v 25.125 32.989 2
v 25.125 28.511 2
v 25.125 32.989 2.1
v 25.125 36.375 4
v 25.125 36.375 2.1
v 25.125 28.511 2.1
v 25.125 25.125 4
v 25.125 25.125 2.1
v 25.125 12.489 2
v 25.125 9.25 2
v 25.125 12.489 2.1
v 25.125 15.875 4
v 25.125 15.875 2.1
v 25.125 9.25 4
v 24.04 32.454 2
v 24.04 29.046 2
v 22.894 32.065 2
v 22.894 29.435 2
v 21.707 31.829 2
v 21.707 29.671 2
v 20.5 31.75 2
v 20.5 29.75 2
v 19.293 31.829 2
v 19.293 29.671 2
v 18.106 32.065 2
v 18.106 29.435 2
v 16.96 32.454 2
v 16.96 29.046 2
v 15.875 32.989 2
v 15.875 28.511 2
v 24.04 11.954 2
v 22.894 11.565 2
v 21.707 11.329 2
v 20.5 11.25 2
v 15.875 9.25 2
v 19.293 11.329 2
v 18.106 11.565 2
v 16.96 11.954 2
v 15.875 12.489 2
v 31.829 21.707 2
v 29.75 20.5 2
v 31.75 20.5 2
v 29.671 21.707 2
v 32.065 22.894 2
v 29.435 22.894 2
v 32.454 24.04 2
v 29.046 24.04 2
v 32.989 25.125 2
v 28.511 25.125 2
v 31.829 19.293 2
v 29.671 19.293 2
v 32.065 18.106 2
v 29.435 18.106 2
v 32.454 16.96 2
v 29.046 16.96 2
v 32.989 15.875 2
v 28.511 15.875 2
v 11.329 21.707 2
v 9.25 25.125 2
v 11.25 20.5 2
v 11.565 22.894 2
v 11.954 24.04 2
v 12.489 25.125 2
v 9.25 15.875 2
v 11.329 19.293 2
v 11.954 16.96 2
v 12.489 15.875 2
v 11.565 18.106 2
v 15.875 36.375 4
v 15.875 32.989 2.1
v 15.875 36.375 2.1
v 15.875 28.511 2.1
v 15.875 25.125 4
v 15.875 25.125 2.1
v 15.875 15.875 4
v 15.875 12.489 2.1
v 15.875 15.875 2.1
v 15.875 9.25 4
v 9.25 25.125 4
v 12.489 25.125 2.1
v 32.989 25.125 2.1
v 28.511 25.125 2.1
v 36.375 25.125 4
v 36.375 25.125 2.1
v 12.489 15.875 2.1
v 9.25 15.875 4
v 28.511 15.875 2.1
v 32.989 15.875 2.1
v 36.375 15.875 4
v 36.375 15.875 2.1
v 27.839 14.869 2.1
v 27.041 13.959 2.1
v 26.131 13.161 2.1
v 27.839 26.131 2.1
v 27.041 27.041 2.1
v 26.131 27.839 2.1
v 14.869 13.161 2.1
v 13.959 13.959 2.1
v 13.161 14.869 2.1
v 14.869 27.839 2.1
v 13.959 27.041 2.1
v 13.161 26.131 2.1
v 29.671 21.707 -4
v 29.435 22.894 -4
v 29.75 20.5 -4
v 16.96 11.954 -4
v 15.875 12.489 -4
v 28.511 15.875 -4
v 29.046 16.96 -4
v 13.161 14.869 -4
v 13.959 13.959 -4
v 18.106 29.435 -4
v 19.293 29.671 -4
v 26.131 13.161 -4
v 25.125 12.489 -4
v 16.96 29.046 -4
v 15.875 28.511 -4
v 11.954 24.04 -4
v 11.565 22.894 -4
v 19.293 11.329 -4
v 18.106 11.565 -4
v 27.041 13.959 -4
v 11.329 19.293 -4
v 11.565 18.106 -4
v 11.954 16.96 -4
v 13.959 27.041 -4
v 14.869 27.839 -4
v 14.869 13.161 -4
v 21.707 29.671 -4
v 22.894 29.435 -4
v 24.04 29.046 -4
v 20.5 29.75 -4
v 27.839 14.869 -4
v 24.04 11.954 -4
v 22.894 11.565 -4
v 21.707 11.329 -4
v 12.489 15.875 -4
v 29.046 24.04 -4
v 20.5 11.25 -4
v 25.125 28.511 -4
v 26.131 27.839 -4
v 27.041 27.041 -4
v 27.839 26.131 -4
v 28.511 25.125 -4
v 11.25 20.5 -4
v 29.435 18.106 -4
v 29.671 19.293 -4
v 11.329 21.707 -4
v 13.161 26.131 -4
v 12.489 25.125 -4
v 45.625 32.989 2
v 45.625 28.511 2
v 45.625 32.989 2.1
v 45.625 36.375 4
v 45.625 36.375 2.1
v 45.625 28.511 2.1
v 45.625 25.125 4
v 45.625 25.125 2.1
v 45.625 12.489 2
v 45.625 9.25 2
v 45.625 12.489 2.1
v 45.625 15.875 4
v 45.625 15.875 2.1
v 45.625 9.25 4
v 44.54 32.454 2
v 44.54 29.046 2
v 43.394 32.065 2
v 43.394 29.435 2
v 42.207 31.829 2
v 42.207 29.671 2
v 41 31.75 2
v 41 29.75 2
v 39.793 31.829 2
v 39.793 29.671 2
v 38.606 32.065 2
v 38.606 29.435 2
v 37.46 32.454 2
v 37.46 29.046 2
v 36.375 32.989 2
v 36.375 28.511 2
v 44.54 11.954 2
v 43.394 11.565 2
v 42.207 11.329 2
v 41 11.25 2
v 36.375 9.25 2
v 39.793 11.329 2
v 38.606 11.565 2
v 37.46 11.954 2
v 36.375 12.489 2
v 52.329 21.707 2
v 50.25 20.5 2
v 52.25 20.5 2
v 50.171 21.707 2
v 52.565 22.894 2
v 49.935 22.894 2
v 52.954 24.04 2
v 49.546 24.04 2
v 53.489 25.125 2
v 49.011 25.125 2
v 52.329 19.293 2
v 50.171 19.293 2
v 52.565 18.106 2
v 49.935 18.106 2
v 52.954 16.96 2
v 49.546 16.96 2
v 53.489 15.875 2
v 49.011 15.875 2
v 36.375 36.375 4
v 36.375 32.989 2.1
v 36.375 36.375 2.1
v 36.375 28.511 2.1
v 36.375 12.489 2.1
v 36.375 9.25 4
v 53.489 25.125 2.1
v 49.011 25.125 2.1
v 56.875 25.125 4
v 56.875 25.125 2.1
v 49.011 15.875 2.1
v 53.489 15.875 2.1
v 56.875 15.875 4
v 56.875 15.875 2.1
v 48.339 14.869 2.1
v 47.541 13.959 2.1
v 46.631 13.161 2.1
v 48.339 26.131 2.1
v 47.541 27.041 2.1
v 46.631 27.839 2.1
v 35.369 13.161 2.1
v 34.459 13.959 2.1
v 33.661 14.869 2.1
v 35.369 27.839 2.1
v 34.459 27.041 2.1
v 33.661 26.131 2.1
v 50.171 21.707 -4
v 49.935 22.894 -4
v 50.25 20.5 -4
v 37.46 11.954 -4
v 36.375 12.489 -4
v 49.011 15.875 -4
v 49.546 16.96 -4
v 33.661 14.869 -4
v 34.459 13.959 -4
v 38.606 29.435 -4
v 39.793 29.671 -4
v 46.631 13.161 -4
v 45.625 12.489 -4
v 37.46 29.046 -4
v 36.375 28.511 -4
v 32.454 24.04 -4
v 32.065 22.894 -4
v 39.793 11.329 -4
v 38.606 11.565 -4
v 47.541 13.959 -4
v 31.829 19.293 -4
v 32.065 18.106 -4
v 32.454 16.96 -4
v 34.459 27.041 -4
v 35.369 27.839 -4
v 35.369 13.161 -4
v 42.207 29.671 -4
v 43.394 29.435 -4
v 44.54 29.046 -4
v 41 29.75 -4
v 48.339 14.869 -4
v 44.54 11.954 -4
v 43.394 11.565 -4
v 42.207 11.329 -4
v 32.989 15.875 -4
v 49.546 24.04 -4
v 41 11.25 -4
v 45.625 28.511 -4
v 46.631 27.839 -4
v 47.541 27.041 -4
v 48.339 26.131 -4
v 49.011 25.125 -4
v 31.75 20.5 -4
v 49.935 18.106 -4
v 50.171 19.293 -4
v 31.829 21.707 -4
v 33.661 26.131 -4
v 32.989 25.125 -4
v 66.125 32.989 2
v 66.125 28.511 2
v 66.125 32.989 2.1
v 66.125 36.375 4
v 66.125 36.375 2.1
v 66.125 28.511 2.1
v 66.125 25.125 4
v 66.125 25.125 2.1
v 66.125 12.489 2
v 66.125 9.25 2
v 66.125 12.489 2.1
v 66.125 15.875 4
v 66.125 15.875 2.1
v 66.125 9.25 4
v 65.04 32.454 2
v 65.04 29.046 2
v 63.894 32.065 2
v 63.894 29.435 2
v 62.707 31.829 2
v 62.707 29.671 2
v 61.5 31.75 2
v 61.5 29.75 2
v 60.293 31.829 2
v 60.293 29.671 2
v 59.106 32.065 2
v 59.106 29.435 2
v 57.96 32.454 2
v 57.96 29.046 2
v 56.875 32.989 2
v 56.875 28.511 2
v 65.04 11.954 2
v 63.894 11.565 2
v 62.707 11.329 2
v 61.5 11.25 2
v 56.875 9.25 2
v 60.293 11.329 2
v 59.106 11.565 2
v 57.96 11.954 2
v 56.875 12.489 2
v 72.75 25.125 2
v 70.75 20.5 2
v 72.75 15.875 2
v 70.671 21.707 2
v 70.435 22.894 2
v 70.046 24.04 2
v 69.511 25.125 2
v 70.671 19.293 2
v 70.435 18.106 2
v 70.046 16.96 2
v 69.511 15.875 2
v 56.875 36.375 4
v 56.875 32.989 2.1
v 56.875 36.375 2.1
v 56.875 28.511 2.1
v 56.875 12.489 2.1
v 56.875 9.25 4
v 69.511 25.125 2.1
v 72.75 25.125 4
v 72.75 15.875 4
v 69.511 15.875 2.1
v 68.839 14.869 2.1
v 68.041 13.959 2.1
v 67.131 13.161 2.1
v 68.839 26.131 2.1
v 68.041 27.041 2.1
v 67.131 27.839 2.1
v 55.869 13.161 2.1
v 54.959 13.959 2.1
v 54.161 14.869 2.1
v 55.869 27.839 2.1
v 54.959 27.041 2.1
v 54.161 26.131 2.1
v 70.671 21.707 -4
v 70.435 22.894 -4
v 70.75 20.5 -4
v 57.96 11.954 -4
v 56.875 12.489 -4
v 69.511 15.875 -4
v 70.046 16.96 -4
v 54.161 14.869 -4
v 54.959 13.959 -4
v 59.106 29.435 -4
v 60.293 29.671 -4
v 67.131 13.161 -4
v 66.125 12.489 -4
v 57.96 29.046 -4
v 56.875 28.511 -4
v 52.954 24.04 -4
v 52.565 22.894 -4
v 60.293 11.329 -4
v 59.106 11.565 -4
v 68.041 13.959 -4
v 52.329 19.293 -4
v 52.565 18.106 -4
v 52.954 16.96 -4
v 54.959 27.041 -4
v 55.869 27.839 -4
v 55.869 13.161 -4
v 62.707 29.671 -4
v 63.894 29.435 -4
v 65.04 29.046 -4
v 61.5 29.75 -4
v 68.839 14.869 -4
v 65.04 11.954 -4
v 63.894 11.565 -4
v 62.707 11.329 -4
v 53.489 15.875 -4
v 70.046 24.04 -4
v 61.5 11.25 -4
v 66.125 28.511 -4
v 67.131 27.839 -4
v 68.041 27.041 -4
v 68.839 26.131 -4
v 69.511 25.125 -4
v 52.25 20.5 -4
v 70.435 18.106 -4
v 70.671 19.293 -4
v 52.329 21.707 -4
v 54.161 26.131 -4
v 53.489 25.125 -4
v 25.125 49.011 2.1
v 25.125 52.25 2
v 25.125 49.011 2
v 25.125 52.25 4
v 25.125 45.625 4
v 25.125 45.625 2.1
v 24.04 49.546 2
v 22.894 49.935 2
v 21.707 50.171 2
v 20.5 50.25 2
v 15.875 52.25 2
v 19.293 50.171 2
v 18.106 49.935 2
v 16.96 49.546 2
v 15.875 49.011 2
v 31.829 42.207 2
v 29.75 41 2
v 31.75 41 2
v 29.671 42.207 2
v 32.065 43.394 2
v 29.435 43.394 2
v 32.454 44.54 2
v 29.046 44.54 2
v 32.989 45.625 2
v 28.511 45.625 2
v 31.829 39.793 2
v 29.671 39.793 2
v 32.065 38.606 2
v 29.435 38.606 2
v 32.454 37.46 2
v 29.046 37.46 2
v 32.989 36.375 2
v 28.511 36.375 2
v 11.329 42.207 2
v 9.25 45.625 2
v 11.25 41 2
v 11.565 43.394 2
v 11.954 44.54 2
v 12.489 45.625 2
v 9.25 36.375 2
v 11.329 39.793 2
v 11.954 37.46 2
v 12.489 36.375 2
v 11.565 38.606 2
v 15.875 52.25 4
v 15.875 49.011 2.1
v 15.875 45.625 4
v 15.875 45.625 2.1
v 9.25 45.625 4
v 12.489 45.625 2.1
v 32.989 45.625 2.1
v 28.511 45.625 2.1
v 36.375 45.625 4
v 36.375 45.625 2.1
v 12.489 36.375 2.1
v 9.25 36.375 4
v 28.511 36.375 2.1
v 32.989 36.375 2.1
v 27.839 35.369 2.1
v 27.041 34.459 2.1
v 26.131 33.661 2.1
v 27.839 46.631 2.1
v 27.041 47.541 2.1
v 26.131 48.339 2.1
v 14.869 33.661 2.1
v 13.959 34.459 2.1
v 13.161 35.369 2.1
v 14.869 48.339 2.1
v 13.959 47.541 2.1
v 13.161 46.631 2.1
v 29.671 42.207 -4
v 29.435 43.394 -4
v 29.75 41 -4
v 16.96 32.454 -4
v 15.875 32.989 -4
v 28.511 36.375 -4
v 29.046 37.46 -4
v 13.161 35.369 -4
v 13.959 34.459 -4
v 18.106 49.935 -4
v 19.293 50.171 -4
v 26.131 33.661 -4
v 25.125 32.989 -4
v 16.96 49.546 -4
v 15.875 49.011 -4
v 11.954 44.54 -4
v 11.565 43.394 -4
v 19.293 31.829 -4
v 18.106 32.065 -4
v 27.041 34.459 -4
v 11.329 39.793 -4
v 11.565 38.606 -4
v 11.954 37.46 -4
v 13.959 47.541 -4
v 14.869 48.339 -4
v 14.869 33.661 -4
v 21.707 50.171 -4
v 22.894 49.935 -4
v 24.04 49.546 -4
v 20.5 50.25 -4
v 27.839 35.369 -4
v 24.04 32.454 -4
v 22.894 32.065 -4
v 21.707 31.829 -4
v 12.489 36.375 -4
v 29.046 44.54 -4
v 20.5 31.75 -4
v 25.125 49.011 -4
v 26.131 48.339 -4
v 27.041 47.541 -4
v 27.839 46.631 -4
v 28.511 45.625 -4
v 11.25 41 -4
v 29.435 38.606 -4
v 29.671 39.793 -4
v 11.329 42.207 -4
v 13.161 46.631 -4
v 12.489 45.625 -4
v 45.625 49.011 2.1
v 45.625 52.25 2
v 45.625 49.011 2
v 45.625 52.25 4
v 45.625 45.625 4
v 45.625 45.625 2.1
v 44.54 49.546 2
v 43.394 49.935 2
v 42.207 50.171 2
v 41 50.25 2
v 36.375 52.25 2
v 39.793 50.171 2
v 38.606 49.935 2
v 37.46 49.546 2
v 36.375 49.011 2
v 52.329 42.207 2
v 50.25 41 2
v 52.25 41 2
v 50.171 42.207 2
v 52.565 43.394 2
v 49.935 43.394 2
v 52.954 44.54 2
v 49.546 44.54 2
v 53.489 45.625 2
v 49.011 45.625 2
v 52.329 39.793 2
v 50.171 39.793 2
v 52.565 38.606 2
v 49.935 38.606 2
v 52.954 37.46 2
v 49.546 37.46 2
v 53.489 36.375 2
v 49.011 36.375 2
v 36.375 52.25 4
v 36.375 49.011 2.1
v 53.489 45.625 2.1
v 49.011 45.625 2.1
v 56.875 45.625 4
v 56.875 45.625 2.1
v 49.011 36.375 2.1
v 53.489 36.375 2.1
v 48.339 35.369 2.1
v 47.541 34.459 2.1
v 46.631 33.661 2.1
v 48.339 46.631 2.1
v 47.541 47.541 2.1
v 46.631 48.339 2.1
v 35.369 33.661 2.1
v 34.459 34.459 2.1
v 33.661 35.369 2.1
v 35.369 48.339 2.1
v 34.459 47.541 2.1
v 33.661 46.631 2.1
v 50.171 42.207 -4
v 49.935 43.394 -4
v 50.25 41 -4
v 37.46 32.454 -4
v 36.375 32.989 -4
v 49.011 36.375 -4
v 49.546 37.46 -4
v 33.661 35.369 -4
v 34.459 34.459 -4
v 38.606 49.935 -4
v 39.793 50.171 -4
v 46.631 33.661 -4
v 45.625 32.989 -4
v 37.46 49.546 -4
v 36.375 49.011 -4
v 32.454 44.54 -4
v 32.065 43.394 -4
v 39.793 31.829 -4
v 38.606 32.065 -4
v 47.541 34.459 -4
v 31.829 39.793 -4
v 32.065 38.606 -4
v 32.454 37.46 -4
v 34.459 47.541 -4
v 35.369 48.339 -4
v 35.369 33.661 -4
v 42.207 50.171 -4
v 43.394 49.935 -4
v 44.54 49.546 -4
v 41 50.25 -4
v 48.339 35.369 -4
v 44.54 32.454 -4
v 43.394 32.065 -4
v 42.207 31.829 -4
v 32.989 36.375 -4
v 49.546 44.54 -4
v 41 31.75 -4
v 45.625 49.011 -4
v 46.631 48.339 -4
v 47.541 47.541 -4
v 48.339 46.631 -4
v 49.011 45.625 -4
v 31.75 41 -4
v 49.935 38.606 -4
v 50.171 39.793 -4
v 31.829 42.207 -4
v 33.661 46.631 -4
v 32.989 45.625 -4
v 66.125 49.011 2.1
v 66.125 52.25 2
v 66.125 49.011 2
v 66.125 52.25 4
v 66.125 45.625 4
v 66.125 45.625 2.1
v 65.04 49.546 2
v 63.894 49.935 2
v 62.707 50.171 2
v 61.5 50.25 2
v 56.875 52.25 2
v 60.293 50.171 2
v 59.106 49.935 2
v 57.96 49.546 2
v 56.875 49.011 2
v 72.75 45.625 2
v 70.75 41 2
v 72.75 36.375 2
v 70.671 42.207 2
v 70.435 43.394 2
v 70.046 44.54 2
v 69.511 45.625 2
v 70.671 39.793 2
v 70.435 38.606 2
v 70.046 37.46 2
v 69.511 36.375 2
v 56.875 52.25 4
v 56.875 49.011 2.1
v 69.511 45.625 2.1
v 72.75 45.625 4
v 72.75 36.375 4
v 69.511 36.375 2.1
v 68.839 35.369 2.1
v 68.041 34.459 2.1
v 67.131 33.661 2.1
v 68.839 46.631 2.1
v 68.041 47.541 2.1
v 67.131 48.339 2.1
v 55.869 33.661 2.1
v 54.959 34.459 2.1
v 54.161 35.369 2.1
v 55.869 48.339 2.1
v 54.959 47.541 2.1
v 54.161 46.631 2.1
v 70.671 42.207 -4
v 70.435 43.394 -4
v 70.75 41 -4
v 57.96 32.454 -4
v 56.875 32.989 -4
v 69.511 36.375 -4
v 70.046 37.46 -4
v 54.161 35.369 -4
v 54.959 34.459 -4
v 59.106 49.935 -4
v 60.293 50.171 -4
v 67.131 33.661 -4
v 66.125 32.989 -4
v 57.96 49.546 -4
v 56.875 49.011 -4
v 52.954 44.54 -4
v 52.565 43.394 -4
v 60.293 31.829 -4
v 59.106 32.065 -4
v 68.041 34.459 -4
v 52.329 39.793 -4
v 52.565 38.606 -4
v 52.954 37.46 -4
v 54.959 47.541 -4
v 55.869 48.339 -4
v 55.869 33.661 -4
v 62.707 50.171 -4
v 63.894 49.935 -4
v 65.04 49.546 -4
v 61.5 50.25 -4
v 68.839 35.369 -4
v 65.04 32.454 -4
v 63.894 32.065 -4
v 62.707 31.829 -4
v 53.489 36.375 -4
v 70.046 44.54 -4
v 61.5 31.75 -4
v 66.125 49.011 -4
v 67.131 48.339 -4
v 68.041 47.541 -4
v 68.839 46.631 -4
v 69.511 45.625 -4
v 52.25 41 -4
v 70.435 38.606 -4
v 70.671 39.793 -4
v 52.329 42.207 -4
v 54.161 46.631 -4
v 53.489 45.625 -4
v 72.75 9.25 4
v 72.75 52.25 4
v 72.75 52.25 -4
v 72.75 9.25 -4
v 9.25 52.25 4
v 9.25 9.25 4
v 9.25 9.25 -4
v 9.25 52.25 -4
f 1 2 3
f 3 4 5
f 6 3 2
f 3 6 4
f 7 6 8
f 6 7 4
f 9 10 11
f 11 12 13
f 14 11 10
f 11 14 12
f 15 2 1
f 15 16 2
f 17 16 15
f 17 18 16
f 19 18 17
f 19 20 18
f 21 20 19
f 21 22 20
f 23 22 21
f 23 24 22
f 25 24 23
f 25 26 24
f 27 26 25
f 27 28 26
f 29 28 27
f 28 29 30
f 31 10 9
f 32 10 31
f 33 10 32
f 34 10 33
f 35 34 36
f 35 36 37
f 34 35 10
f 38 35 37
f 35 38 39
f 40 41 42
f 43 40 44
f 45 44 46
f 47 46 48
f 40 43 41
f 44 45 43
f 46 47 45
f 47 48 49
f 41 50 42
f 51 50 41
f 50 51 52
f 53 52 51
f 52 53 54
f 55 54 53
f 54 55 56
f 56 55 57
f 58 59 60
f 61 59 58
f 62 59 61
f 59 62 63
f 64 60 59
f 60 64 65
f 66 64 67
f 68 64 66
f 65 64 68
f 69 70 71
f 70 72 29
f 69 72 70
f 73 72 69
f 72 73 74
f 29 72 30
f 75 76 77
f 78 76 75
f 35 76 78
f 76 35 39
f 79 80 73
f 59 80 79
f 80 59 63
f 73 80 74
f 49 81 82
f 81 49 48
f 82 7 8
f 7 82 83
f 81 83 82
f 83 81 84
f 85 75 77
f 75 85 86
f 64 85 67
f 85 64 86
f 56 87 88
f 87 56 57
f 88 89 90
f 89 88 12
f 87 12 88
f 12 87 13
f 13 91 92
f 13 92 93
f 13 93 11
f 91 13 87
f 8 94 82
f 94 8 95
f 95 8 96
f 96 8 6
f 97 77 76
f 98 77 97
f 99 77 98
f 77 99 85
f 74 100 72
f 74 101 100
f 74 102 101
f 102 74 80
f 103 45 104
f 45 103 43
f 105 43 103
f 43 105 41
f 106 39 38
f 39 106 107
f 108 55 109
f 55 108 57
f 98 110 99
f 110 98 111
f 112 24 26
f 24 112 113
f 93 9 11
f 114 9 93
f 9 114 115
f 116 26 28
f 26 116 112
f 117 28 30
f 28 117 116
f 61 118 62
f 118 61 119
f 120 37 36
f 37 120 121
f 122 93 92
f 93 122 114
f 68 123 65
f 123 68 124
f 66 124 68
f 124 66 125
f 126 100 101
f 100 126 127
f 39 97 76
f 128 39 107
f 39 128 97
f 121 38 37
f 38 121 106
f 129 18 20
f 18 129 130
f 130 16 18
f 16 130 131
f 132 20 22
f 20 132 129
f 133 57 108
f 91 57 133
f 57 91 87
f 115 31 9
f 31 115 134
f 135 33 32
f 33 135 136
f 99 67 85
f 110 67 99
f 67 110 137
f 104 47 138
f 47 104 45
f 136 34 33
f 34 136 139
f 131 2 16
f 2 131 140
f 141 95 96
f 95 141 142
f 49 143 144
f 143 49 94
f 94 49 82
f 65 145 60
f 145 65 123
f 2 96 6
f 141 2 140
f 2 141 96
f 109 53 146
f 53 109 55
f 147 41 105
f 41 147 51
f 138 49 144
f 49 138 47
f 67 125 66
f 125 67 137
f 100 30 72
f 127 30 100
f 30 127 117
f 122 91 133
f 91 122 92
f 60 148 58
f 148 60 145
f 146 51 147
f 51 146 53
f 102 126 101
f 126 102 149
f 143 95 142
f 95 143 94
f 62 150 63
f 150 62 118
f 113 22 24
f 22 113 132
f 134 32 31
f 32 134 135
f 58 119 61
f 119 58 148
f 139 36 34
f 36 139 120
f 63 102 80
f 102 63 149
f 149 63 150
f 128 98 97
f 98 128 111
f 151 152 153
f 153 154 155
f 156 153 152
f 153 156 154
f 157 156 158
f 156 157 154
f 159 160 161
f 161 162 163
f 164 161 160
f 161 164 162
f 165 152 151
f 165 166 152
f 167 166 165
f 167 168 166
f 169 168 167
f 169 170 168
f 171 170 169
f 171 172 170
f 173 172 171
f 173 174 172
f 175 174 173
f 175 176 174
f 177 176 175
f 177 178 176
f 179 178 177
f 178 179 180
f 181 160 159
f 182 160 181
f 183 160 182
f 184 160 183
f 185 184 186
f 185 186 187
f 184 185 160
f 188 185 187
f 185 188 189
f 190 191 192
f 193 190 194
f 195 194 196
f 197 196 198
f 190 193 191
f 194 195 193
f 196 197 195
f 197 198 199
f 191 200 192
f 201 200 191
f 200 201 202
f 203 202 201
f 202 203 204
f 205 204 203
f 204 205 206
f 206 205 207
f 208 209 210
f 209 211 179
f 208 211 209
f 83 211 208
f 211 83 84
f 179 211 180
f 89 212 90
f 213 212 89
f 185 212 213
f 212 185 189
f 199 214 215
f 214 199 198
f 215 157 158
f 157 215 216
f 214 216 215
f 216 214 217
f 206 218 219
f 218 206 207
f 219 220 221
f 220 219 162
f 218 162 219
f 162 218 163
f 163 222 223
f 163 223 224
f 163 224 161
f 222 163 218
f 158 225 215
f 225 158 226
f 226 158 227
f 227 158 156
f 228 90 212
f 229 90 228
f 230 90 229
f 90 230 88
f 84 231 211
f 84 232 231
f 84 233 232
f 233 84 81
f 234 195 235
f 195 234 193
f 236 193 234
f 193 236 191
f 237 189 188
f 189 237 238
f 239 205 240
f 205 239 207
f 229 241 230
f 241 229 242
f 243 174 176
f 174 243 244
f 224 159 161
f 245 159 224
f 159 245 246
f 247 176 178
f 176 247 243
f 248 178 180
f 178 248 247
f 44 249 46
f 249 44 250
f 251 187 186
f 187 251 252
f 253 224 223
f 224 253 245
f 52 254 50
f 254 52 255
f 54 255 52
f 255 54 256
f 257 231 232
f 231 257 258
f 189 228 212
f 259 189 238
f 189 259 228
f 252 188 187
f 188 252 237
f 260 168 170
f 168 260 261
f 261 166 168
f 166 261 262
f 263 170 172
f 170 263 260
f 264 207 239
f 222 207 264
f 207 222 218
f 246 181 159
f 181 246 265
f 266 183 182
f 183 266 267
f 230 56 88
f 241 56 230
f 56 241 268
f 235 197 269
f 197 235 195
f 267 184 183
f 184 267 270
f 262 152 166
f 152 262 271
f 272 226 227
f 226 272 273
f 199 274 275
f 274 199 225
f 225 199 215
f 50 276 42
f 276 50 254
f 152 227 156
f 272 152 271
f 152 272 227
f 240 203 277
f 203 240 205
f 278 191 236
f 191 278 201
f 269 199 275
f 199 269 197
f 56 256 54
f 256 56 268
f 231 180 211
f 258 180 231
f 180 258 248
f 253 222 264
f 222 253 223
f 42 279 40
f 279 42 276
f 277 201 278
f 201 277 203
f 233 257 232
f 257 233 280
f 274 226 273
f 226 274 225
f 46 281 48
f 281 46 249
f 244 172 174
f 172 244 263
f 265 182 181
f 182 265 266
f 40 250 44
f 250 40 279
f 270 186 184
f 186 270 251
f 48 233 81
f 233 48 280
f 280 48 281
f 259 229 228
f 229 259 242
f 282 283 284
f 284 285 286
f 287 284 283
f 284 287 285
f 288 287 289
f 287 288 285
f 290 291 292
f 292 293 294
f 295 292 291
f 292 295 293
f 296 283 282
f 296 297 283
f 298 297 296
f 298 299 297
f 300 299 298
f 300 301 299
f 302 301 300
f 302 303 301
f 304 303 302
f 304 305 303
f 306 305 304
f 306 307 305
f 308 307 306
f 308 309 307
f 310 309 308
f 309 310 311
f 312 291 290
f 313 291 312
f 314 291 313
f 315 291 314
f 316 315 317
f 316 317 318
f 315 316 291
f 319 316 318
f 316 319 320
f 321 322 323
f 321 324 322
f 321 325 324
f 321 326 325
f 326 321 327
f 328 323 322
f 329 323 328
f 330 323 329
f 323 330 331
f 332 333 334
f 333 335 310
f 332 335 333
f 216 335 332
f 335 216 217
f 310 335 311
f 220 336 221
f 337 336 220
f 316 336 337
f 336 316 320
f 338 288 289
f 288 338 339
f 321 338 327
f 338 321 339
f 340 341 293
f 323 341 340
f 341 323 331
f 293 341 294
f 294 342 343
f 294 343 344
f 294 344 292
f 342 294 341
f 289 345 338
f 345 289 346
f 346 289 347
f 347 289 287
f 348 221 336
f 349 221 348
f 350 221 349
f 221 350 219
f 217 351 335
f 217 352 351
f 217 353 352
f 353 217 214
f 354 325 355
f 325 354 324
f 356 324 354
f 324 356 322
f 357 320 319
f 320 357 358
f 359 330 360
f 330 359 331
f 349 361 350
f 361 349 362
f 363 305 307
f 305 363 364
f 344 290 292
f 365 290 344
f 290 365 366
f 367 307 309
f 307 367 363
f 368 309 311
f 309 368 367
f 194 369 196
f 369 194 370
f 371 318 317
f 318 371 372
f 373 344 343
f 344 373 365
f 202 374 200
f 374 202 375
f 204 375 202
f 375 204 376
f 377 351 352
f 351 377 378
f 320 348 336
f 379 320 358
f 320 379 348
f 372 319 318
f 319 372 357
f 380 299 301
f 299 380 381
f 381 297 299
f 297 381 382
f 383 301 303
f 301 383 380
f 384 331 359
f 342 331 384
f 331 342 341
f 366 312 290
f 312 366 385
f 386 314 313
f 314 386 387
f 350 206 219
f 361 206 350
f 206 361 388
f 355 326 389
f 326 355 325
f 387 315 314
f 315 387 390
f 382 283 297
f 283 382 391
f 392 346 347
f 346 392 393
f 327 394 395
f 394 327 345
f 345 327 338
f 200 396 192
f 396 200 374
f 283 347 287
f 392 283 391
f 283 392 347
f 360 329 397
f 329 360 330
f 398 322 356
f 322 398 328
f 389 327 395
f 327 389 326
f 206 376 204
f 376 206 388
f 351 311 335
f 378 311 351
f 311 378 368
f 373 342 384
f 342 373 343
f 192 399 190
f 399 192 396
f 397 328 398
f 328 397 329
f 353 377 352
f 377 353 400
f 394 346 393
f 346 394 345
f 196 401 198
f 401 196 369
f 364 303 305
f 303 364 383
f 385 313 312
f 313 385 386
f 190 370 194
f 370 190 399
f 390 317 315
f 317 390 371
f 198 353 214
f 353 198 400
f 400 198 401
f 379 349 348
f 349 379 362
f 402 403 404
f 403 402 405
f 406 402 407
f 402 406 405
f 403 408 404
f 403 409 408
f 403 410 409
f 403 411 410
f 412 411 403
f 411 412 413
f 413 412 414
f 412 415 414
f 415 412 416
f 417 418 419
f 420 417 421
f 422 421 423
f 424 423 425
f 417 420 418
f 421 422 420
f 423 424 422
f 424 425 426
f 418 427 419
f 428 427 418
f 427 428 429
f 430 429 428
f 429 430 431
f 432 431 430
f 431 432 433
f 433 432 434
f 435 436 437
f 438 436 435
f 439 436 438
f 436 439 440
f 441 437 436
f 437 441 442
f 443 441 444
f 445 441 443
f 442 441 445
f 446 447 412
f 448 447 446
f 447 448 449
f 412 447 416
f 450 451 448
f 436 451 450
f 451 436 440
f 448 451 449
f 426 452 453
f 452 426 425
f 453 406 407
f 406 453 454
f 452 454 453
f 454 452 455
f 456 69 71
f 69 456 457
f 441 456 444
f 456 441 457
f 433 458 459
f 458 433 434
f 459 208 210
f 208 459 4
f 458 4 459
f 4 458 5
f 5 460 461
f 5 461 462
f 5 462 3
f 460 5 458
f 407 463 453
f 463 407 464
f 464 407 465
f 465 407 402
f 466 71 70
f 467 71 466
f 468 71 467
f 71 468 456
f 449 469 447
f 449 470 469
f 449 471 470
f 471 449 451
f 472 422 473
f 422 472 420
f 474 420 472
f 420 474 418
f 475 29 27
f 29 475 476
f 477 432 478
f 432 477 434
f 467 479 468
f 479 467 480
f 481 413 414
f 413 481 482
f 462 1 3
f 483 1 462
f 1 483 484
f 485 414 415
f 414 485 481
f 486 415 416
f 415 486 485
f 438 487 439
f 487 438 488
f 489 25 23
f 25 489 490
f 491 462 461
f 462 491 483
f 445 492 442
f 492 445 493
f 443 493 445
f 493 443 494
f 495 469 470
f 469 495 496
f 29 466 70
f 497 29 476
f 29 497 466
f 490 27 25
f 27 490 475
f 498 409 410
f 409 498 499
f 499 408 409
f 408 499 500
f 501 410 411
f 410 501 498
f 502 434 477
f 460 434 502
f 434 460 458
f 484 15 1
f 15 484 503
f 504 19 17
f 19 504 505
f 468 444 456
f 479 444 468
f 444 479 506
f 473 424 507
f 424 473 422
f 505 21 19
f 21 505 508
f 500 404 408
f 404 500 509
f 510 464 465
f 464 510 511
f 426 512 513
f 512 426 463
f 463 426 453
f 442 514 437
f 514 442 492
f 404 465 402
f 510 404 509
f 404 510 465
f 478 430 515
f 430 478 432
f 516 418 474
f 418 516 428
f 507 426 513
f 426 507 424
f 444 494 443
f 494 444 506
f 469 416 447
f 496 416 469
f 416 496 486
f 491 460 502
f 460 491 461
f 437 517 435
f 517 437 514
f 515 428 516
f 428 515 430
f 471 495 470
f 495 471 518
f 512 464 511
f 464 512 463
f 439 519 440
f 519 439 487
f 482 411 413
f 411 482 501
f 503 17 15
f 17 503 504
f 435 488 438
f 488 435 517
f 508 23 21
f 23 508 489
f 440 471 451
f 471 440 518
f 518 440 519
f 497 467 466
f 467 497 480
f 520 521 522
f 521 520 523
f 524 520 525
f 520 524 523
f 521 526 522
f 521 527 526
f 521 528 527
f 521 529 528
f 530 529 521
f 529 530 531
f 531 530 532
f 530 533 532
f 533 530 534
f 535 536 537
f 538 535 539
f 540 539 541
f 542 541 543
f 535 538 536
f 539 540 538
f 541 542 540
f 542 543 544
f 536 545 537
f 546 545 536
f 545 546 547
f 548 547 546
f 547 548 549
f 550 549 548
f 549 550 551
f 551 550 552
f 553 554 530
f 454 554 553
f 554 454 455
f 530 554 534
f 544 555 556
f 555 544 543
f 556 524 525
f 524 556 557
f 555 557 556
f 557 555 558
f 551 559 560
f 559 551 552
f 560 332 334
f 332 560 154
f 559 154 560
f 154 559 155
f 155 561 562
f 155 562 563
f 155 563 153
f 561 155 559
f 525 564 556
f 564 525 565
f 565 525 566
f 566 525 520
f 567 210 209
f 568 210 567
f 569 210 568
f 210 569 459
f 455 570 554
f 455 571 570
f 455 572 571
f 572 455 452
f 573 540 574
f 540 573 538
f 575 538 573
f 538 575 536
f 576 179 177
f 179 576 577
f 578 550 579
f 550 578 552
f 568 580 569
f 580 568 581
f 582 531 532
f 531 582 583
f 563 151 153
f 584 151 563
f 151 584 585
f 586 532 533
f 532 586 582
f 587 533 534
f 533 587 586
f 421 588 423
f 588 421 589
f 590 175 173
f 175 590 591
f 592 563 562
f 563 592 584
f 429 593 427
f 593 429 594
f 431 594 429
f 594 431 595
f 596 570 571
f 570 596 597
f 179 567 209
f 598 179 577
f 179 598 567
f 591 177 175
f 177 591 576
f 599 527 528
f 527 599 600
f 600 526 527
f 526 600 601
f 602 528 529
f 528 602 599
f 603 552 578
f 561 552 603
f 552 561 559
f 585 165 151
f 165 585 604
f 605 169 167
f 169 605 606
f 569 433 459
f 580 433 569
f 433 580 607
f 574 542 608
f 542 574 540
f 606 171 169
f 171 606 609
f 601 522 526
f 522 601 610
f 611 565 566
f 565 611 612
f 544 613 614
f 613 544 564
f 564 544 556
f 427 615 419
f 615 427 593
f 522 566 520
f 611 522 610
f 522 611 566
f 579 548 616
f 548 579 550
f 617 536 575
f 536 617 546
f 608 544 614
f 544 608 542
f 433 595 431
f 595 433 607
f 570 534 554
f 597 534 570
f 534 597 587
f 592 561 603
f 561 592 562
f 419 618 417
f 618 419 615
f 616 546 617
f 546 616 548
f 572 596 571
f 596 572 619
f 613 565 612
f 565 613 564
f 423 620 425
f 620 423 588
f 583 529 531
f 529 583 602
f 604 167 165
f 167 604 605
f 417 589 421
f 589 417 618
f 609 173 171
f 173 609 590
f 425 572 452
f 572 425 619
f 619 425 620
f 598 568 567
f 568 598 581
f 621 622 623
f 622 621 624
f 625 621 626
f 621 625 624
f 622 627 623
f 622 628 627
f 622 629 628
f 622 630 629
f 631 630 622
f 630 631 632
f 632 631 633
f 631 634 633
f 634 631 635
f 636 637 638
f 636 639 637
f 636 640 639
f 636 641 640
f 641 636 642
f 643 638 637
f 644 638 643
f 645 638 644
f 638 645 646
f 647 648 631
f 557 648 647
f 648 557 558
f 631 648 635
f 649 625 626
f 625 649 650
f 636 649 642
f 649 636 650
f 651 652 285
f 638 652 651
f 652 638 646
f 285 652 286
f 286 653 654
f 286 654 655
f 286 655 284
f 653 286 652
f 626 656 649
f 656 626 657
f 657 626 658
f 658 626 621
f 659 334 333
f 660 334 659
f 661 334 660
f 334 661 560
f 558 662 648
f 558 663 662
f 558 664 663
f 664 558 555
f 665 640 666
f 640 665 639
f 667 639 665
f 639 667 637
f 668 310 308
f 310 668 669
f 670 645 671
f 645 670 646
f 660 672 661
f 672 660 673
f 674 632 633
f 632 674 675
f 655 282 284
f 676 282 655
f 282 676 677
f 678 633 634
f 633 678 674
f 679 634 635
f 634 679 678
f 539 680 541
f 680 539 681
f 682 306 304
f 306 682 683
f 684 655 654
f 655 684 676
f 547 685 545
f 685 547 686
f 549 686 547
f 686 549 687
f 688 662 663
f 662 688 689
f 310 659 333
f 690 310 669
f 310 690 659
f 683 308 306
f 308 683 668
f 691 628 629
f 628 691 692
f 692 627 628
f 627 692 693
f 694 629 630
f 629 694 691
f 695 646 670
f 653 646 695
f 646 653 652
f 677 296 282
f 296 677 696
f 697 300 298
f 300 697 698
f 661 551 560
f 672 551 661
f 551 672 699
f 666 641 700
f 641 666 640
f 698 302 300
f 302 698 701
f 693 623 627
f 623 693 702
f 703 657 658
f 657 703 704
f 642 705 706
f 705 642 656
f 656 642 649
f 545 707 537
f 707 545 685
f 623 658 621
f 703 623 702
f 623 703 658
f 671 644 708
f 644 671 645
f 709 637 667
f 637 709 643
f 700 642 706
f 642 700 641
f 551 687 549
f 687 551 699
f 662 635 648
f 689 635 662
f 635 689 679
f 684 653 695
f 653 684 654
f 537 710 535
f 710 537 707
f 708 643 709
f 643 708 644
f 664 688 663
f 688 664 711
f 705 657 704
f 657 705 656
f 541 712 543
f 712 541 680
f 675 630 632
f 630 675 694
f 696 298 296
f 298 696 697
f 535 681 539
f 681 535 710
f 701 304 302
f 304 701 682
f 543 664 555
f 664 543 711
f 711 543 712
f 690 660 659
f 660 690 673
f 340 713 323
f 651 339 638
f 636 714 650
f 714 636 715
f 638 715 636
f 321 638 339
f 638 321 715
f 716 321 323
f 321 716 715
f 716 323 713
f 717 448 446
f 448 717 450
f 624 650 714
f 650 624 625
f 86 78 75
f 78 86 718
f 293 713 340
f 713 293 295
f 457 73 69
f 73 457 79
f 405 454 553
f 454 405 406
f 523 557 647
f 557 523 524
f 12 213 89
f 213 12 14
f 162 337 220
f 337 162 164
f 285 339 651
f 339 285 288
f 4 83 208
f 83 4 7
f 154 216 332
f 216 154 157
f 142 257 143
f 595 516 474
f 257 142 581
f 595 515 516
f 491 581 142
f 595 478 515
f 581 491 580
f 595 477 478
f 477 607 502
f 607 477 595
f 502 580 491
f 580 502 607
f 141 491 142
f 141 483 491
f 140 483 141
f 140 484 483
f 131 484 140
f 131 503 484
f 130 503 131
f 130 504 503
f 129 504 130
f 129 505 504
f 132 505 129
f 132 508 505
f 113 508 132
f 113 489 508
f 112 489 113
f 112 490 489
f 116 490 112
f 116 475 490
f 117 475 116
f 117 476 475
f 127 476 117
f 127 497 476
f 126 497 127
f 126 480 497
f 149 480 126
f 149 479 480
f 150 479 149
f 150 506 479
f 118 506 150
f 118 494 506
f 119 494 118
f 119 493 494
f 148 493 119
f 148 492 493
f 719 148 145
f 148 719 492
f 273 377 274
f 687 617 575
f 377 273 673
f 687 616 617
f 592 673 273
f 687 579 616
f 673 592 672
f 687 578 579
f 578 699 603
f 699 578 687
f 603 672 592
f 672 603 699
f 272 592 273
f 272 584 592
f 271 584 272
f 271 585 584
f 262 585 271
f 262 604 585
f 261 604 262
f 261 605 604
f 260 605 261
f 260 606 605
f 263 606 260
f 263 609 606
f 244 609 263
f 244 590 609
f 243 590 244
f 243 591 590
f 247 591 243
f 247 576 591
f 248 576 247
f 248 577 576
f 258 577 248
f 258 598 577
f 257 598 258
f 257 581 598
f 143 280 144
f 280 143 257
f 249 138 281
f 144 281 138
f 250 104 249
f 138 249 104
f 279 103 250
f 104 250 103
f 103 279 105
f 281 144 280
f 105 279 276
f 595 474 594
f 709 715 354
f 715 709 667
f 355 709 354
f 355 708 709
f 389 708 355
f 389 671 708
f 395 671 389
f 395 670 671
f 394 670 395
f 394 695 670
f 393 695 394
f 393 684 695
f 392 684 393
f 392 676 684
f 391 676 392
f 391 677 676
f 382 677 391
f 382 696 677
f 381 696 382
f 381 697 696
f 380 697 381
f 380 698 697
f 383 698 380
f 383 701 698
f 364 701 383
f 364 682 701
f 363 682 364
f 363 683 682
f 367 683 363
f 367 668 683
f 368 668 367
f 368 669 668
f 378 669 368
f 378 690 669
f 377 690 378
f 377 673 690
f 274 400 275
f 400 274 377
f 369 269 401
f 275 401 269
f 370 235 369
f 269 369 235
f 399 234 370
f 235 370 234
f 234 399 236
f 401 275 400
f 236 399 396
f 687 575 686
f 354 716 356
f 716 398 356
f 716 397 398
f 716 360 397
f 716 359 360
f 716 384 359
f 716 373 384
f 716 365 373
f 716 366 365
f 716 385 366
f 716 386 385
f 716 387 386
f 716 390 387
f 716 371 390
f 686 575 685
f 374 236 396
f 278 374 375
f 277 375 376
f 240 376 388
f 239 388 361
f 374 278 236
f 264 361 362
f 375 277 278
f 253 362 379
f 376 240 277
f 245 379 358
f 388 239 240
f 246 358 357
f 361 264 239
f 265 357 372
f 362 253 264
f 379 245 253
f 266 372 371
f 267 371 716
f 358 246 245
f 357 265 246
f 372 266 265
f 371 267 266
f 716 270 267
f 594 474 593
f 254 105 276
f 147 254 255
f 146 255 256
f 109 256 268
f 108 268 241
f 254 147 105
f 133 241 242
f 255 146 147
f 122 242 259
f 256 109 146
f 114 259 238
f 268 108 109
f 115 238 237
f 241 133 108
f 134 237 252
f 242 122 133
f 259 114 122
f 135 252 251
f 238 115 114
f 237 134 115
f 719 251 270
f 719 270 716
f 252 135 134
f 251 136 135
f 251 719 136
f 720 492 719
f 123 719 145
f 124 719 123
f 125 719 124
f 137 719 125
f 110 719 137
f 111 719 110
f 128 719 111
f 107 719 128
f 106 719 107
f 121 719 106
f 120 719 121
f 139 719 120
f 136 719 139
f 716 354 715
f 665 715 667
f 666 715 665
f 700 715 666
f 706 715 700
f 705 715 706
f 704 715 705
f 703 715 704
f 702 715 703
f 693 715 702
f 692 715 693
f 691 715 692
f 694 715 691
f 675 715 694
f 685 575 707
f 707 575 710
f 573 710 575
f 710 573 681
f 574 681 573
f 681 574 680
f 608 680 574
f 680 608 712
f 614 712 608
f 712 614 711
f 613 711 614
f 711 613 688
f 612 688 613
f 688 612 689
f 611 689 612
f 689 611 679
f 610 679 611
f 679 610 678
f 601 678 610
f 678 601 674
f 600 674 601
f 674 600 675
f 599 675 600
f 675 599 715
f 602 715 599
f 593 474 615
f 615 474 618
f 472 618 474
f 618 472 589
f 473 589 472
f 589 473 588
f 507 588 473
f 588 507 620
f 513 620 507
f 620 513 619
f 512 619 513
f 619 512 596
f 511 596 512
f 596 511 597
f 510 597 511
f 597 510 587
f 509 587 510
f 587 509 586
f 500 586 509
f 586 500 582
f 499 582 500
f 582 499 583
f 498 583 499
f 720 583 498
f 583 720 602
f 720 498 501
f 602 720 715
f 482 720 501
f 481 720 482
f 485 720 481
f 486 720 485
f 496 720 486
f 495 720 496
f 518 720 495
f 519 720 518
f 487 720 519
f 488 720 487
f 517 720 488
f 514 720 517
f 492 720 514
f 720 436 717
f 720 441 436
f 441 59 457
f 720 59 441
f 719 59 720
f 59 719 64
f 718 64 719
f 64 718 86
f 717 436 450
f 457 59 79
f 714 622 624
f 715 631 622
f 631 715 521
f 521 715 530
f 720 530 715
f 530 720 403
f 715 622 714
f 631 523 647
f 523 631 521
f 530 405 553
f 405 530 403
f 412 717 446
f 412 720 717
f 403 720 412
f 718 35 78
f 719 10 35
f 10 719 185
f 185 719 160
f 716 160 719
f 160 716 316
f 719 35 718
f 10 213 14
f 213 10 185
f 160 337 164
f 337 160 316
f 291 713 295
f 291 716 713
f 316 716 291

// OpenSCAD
// Cell Diameter
cell = 18.5;
// Number of Rows
rows = 3; // [0:10]
// Number of Columns
cols = 2; // [0:10]
// Holder Height
height = 8;
// Space betwen Cells
space = 2;

cubeSize = cell+space;

// number of faces in circle
$fn = 48; 
difference()
{
    translate([(rows+1)*cubeSize/2, (cols+1)*cubeSize/2, 0])
    cube(size = [cubeSize*rows+space, cubeSize*cols+space, height], center = true);
    
    for ( i = [1 : cols] )
    {
        translate([0,i*cubeSize,0])
        for ( ii = [1 : rows] )
        {
            translate([ii*cubeSize,0,0])
            
            union()
            {
                translate([0,0,height/2]) cube(size = [cell/2,cubeSize+3,4], center = true);
                translate([0,0,height/2]) cube(size = [cubeSize+3,cell/2,4], center = true); 
                translate([0,0,-height/2-1.9]) cylinder(h = height, r=cell/2);
            }
            
        }
    }
}

/*for ( i = [1 : numerical_slider2] )
{
    translate([0,i*(21),0])
    for ( i = [1 : numerical_slider] )
    {
        translate([i*(21),0,0])
        difference()
        {
            cube(size = [21,21,8], center = true);
            union()
            {
                translate([0,0,4]) cube(size = [10,23,4], center = true);
                translate([0,0,4]) cube(size = [23,10,4], center = true); 
            }
            translate([0,0,-5.99]) cylinder(h = 8, r=9.1);
        }
    }
}*/
